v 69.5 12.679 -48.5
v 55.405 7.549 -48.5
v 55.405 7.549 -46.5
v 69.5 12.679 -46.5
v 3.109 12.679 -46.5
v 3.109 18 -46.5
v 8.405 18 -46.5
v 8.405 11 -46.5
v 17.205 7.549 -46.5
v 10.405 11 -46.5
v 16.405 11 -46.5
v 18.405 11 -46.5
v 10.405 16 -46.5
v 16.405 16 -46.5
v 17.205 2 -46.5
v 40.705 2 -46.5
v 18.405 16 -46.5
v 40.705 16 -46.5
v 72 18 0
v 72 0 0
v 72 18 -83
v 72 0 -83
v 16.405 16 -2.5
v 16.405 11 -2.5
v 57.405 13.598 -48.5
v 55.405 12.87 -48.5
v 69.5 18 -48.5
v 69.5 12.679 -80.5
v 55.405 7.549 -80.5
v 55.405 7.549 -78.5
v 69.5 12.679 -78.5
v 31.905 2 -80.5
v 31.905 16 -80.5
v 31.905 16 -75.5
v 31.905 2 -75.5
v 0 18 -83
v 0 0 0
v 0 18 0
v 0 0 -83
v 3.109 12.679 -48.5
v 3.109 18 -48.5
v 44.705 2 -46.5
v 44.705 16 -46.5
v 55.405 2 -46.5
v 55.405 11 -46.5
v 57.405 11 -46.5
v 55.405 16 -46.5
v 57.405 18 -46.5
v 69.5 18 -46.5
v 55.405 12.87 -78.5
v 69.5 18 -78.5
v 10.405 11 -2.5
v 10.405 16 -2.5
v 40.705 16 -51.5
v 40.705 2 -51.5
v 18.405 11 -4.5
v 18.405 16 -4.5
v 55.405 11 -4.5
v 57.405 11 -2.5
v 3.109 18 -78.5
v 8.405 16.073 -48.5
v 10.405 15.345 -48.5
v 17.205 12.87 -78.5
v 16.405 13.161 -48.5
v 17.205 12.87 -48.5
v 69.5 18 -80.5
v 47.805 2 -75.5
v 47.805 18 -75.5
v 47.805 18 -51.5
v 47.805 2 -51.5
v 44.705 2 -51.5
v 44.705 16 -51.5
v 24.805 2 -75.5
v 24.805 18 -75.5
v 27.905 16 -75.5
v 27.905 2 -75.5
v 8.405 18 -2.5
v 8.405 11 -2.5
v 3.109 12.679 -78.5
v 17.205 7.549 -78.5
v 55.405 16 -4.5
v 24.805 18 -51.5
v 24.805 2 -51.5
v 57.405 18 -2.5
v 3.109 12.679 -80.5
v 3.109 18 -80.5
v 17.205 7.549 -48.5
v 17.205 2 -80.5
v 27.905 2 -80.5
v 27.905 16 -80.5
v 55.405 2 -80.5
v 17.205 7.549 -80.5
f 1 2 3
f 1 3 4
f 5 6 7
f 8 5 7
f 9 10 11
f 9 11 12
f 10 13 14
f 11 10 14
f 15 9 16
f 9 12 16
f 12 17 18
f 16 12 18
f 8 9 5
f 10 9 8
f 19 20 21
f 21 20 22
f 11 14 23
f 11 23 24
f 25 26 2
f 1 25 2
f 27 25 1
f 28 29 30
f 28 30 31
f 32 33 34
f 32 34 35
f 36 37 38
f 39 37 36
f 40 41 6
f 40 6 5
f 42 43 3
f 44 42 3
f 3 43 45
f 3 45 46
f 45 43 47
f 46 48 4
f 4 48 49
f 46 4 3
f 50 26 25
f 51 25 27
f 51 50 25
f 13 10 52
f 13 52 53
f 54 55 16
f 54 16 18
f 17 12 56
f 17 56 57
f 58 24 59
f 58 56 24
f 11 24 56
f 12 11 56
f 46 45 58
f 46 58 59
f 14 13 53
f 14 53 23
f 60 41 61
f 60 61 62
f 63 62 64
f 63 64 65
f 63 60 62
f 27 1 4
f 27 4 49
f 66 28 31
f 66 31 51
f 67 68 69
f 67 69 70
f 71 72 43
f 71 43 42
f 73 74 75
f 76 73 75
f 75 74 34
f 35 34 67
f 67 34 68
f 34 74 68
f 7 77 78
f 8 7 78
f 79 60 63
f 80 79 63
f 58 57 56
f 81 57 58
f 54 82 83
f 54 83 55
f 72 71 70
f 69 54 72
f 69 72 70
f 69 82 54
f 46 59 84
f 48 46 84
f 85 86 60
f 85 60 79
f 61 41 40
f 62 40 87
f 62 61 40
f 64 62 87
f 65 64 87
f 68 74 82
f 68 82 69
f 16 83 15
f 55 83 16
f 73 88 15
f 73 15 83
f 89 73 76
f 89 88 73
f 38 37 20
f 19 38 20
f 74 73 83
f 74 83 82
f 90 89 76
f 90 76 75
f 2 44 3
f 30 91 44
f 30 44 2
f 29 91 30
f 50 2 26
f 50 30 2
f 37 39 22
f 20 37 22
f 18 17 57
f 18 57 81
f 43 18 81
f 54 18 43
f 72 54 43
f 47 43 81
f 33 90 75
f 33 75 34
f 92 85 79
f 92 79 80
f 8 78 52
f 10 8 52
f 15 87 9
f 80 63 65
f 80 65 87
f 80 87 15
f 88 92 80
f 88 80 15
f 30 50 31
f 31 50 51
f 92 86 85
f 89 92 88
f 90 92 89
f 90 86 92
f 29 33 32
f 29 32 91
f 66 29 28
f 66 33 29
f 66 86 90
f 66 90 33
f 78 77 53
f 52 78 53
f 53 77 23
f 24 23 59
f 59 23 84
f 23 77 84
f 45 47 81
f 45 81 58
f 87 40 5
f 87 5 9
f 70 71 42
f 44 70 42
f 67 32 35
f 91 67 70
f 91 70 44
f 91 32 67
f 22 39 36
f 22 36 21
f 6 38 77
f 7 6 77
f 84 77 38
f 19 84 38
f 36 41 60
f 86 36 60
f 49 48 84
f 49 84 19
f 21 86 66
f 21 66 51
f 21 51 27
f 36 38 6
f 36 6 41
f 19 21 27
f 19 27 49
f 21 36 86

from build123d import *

# Parameters (mm, degrees)
SKETCH1_W           = 72
SKETCH1_H           = 83
BOSS_EXTRUDE1_DEPTH = 18
CAVITY2_START       = -80.5
CAVITY2_DEPTH       = 34
CAVITY2_START_2     = -48.5
CAVITY2_2_DEPTH     = 46
CAVITY2_3_DEPTH     = 5
CAVITY2_START_3     = -51.5
CAVITY2_4_DEPTH     = 5
CAVITY2_START_4     = -4.5
CAVITY2_5_OUTLINE_W = 37
CAVITY2_5_OUTLINE_H = 5
CAVITY2_5_DEPTH     = 2
CAVITY2_6_DEPTH     = 2
CAVITY2_7_DEPTH     = 2


# Read off the part's stored shape, not the designer's step: Cavity2
with BuildPart() as part:
    # Sketch1 → Boss-Extrude1 (new body)
    with BuildSketch(Plane(origin=(0, 0, 0), x_dir=(1, 0, 0), z_dir=(0, 1, 0))):
        with Locations((36, 41.5)):
            Rectangle(SKETCH1_W, SKETCH1_H)
    extrude(amount=BOSS_EXTRUDE1_DEPTH)

    # Cavity2 outline → Cavity2 (cut)
    with BuildSketch(Plane.XY.offset(CAVITY2_START)):
        Polygon((55.404610688, 2), (55.404610688, 12.86969785), (69.5, 18), (47.804610688, 18), (47.804610688, 2), align=None)
        Polygon((24.804610688, 18), (3.109221376, 18), (17.204610688, 12.86969785), (17.204610688, 2), (24.804610688, 2), align=None)
    extrude(amount=CAVITY2_DEPTH, mode=Mode.SUBTRACT)

    # Cavity2 2 outline → Cavity2 2 (cut)
    with BuildSketch(Plane.XY.offset(CAVITY2_START_2)):
        Polygon((55.404610688, 11), (57.404610688, 11), (57.404610688, 18), (8.404610688, 18), (8.404610688, 11), (10.404610688, 11), (10.404610688, 16), (16.404610688, 16), (16.404610688, 11), (18.404610688, 11), (18.404610688, 16), (55.404610688, 16), align=None)
    extrude(amount=CAVITY2_2_DEPTH, mode=Mode.SUBTRACT)

    # Cavity2 3 outline → Cavity2 3 (cut)
    with BuildSketch(Plane.XY.offset(CAVITY2_START)):
        Polygon((47.804610688, 2), (47.804610688, 18), (24.804610688, 18), (24.804610688, 2), (27.904610688, 2), (27.904610688, 16), (31.904610688, 16), (31.904610688, 2), align=None)
    extrude(amount=CAVITY2_3_DEPTH, mode=Mode.SUBTRACT)

    # Cavity2 4 outline → Cavity2 4 (cut)
    with BuildSketch(Plane.XY.offset(CAVITY2_START_3)):
        Polygon((47.804610688, 2), (47.804610688, 18), (24.804610688, 18), (24.804610688, 2), (40.704610688, 2), (40.704610688, 16), (44.704610688, 16), (44.704610688, 2), align=None)
    extrude(amount=CAVITY2_4_DEPTH, mode=Mode.SUBTRACT)

    # Cavity2 5 outline → Cavity2 5 (cut)
    with BuildSketch(Plane.XY.offset(CAVITY2_START_4)):
        with Locations((36.904610688, 13.5)):
            Rectangle(CAVITY2_5_OUTLINE_W, CAVITY2_5_OUTLINE_H)
    extrude(amount=CAVITY2_5_DEPTH, mode=Mode.SUBTRACT)

    # Cavity2 6 outline → Cavity2 6 (cut)
    with BuildSketch(Plane.XY.offset(CAVITY2_START)):
        Polygon((55.404610688, 7.548808988), (69.5, 12.679111138), (69.5, 18), (55.404610688, 12.86969785), align=None)
        Polygon((3.109221376, 18), (3.109221376, 12.679111138), (17.204610688, 7.548808988), (17.204610688, 12.86969785), align=None)
    extrude(amount=CAVITY2_6_DEPTH, mode=Mode.SUBTRACT)

    # Cavity2 7 outline → Cavity2 7 (cut)
    with BuildSketch(Plane.XY.offset(CAVITY2_START_2)):
        Polygon((55.404610688, 7.548808988), (69.5, 12.679111138), (69.5, 18), (57.404610688, 13.597638319), (57.404610688, 11), (55.404610688, 11), align=None)
        Polygon((8.404610688, 11), (8.404610688, 16.072635912), (3.109221376, 18), (3.109221376, 12.679111138), (17.204610688, 7.548808988), (17.204610688, 11), (16.404610688, 11), (16.404610688, 13.160874037), (10.404610688, 15.344695443), (10.404610688, 11), align=None)
    extrude(amount=CAVITY2_7_DEPTH, mode=Mode.SUBTRACT)


solid = part.part
